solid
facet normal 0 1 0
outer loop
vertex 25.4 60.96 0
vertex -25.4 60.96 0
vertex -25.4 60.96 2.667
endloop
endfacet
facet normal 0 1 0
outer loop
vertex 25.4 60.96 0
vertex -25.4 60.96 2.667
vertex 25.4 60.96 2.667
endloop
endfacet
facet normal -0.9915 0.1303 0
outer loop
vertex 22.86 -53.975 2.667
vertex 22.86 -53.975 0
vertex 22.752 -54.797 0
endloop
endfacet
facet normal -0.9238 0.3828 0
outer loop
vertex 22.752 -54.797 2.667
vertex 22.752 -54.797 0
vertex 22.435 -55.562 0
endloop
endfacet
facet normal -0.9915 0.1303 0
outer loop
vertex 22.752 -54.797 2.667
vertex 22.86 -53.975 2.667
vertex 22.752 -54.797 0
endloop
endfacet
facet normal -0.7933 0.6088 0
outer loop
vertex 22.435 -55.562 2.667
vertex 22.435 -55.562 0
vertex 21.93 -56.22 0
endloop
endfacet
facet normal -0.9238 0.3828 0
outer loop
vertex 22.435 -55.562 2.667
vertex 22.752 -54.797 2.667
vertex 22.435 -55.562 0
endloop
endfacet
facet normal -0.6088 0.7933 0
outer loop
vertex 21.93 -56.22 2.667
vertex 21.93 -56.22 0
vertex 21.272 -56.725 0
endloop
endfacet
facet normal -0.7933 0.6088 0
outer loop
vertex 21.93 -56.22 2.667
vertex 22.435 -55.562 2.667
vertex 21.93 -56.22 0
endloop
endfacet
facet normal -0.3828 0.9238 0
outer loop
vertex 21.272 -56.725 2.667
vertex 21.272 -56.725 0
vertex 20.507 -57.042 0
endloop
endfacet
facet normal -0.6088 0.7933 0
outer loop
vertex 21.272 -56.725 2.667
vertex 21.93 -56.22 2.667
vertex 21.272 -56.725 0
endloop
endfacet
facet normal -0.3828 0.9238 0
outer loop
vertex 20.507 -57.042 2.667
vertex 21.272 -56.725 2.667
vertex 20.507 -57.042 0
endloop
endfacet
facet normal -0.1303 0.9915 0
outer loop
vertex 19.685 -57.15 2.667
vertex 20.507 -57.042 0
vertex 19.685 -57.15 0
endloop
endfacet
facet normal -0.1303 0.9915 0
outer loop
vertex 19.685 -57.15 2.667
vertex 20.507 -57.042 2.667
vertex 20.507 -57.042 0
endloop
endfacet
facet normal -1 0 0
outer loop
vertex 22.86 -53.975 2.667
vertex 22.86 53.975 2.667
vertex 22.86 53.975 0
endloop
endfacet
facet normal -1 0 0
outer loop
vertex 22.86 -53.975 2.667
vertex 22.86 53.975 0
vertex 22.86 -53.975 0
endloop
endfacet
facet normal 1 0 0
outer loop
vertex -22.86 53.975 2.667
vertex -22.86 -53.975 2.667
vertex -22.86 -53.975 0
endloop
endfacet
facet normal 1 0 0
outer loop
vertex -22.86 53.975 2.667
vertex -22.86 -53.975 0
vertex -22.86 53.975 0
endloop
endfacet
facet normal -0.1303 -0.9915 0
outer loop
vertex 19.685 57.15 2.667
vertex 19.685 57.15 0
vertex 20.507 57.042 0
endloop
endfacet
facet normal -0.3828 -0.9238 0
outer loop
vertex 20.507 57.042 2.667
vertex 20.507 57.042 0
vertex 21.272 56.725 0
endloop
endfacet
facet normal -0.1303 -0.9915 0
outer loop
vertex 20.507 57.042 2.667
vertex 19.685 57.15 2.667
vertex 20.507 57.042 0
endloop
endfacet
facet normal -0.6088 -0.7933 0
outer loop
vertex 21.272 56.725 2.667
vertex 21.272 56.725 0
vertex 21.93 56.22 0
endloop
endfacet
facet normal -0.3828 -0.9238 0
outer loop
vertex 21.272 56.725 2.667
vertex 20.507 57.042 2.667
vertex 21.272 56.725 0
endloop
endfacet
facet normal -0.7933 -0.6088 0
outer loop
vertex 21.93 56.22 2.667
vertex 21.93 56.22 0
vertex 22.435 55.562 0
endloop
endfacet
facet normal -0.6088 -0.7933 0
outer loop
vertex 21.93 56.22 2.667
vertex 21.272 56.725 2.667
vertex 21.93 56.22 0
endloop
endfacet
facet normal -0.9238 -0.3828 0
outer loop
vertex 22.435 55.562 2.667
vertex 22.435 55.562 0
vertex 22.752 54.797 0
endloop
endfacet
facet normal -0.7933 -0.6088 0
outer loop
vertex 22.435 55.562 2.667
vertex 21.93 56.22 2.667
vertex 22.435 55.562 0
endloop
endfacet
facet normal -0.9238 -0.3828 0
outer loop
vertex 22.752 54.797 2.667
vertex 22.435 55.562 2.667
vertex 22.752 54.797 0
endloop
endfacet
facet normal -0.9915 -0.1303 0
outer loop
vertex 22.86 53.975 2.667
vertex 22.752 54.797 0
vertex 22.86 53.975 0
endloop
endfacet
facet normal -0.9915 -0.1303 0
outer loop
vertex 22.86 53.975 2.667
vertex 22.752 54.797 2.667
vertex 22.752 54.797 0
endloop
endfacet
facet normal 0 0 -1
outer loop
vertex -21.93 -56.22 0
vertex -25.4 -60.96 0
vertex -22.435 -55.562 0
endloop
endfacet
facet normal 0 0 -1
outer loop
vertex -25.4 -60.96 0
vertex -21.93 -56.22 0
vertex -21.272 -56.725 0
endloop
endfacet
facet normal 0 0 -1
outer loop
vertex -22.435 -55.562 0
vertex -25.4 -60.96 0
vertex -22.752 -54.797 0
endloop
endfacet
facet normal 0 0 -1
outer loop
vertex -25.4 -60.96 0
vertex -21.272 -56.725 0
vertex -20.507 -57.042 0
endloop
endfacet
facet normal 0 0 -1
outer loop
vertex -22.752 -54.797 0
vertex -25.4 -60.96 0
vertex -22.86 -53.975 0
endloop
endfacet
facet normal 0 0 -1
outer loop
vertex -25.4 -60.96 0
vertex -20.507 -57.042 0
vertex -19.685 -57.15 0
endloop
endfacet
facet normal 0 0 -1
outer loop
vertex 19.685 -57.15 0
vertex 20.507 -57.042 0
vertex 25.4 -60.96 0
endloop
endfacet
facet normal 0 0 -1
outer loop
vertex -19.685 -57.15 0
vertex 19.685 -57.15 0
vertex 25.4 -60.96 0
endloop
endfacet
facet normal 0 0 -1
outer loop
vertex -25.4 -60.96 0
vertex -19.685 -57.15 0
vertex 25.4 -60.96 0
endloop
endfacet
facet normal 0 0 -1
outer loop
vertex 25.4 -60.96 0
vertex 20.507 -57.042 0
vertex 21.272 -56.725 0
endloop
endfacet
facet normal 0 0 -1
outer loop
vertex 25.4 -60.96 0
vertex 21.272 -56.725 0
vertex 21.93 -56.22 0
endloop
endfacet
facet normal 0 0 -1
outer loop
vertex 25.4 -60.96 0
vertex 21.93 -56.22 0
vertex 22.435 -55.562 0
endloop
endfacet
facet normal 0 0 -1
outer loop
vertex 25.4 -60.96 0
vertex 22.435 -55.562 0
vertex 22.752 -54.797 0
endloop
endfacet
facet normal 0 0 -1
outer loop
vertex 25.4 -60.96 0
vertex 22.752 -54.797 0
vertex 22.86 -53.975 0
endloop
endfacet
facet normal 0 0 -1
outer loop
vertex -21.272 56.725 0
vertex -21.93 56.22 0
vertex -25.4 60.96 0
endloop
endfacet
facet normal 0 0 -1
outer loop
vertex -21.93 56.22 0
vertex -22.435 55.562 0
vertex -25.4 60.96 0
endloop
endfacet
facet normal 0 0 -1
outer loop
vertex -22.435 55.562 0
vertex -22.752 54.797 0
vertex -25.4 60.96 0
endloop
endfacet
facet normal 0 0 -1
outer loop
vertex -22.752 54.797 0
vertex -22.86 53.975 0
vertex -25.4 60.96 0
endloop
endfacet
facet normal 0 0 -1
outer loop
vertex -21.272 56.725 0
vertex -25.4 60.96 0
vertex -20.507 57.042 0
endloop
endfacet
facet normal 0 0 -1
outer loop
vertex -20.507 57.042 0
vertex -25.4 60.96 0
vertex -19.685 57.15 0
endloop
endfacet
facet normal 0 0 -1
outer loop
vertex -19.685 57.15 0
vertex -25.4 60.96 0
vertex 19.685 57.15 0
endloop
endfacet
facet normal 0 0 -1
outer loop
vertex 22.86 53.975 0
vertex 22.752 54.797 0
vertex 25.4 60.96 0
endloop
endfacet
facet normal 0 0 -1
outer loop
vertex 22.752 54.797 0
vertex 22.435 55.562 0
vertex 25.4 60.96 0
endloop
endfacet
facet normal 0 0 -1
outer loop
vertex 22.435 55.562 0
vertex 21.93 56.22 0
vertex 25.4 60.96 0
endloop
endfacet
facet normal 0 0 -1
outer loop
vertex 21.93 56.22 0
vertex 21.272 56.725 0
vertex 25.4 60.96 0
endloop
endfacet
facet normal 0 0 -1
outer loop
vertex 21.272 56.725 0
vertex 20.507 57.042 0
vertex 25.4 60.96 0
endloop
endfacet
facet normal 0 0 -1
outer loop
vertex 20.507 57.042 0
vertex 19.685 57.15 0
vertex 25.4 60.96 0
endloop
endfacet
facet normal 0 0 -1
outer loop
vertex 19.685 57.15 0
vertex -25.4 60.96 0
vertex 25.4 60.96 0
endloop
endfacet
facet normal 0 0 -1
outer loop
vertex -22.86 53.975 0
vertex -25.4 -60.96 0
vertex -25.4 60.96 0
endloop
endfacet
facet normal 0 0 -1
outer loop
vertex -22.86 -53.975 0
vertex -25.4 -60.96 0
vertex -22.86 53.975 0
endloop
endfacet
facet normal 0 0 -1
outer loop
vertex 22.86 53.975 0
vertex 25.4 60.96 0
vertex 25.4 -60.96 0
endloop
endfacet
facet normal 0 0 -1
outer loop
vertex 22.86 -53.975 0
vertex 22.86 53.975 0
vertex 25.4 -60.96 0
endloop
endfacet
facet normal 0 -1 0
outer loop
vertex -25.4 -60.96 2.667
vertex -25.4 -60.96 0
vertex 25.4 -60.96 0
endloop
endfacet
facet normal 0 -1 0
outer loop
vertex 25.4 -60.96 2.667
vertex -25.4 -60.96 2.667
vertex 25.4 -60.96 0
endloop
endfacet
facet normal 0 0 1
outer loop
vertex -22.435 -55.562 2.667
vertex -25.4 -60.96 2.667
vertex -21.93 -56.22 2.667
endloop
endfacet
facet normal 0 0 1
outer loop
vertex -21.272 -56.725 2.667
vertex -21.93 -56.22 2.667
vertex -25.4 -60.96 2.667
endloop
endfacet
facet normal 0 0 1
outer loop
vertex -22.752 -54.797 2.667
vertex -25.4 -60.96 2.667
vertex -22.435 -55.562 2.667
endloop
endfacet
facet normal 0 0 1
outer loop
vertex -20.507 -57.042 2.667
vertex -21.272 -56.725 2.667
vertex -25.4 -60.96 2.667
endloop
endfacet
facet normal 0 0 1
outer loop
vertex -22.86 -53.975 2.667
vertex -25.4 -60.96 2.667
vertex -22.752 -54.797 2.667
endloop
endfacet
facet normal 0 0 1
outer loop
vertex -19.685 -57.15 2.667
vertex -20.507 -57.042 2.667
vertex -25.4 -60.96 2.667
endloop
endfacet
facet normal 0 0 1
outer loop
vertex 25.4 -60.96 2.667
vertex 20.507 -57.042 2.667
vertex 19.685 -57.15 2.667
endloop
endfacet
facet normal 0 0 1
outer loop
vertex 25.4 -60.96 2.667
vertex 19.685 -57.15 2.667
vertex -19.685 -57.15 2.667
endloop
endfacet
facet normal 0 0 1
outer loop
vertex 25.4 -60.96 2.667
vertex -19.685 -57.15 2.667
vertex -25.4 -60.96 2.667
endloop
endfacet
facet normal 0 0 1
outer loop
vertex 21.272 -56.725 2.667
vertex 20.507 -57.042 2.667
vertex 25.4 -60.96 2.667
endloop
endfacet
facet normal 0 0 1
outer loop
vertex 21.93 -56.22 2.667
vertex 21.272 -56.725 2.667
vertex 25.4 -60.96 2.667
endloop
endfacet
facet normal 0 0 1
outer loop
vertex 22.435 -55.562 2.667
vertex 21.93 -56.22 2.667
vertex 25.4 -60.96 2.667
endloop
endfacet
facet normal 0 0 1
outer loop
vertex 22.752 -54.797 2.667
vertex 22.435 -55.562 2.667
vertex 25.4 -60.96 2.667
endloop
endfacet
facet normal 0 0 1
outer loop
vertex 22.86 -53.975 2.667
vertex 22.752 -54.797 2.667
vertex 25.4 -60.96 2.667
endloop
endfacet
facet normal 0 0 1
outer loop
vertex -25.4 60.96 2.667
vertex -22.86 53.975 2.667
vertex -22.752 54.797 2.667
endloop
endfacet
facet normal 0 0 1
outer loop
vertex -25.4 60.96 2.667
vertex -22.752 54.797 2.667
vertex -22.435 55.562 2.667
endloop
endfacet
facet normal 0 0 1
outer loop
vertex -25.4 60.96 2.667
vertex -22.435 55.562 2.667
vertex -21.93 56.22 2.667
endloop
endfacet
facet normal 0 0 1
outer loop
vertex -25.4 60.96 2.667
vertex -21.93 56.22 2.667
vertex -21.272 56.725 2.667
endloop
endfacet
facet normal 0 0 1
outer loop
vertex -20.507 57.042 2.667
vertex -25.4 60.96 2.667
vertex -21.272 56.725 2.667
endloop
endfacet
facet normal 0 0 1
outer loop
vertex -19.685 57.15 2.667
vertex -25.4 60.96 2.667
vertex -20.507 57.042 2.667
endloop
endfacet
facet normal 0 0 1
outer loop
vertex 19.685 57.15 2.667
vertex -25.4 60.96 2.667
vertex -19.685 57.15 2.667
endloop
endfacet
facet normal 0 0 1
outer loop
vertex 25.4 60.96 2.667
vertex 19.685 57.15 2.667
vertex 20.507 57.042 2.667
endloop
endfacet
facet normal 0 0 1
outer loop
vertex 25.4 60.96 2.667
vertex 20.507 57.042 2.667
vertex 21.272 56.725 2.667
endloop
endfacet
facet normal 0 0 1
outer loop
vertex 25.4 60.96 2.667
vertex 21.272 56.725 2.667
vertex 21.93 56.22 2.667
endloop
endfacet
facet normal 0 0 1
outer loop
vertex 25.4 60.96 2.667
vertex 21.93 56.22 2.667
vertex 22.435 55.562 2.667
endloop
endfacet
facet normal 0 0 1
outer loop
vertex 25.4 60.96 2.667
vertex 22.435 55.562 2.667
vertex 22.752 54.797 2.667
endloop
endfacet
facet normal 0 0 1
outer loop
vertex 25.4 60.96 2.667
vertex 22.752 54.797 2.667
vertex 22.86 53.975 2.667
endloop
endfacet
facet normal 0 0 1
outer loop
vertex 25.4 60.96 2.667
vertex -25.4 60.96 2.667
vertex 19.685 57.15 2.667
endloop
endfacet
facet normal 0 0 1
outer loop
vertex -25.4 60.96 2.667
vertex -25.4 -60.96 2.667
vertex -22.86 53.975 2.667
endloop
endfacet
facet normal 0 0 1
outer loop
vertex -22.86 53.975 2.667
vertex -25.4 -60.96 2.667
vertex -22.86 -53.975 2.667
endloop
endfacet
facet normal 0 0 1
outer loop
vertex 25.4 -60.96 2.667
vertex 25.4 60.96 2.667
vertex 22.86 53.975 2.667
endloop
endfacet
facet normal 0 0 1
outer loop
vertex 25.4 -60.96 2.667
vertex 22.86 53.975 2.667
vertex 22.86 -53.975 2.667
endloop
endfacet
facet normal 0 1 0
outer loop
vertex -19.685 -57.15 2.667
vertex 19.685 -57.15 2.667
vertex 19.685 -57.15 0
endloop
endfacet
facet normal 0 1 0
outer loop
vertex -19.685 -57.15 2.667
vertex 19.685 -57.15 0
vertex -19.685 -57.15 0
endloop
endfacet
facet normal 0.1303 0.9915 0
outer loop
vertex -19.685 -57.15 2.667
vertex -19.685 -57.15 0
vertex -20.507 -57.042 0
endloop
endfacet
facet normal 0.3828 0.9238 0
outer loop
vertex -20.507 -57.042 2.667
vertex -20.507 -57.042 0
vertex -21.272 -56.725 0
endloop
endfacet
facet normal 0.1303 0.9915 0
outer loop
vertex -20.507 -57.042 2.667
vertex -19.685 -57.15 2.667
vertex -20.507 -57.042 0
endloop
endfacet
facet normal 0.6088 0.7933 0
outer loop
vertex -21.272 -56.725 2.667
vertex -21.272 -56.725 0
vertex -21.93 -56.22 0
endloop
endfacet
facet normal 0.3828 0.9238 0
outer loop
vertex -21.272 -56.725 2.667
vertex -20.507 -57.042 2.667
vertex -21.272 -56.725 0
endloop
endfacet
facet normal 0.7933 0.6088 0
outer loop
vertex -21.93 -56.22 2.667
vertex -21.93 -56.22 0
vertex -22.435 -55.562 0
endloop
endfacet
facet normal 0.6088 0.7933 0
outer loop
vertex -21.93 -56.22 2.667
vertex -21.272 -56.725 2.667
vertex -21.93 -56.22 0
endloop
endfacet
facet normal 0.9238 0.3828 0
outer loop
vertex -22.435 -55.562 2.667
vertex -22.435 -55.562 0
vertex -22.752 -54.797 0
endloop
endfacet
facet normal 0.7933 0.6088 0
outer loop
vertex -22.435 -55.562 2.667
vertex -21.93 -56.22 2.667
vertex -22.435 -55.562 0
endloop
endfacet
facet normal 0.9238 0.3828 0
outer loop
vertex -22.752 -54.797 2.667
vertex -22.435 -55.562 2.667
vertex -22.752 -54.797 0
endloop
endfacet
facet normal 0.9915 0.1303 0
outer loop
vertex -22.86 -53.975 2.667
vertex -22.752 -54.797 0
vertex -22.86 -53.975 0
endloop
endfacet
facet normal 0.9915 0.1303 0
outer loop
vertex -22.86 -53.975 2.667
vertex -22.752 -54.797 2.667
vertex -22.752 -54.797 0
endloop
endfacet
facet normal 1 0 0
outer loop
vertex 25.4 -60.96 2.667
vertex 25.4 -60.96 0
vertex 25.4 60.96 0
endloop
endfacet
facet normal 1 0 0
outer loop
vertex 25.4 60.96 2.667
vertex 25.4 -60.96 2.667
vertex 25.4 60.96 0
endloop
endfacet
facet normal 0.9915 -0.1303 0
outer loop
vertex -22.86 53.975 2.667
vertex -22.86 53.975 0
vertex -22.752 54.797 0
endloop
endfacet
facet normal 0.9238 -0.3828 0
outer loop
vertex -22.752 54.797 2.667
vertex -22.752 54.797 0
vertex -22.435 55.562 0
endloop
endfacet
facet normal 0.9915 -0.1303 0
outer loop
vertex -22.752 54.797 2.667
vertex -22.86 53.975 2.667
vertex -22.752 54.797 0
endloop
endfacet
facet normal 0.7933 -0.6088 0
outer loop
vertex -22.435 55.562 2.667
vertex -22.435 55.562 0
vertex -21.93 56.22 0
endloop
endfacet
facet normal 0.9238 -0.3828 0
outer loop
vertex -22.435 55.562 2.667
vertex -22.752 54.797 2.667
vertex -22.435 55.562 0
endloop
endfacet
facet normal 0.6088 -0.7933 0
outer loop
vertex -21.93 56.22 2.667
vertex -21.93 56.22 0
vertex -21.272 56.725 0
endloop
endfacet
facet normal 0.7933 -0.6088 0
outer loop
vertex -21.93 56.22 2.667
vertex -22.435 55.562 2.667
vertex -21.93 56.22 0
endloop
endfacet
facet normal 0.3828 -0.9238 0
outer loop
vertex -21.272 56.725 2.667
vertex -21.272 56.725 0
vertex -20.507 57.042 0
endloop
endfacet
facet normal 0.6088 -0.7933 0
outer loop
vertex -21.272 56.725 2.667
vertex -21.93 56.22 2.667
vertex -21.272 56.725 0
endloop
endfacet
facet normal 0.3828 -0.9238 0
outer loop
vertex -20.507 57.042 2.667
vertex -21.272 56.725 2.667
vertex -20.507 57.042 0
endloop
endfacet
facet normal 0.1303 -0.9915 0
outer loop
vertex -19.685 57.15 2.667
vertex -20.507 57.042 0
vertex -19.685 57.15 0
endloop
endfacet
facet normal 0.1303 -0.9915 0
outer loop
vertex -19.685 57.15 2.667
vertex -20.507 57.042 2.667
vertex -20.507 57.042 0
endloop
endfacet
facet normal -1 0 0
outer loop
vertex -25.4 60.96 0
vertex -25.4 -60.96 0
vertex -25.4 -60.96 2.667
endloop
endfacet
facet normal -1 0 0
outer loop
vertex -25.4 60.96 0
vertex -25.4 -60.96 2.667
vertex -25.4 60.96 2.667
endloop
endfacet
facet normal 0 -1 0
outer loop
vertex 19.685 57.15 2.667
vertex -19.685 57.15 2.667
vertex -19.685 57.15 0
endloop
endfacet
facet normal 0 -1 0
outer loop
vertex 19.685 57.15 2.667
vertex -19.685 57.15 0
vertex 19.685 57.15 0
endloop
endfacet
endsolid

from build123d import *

# Parameters (mm, degrees)
SKETCH1_W           = 50.8
SKETCH1_H           = 121.92
BOSS_EXTRUDE1_DEPTH = 2.667
CUT_EXTRUDE1_DEPTH  = 67.093830945


with BuildPart() as part:
    # Sketch1 → Boss-Extrude1 (new body)
    with BuildSketch(Plane.XY):
        Rectangle(SKETCH1_W, SKETCH1_H)
    extrude(amount=BOSS_EXTRUDE1_DEPTH)

    # Sketch2 → Cut-Extrude1 (cut, through all)
    with BuildSketch(Plane.XY.offset(2.667)):
        with BuildLine():
            Line((19.685, -57.15), (-19.685, -57.15))
            ThreePointArc((-19.685, -57.15), (-21.93006403, -56.22006403), (-22.86, -53.975))
            Line((-22.86, -53.975), (-22.86, 53.975))
            ThreePointArc((-22.86, 53.975), (-21.93006403, 56.22006403), (-19.685, 57.15))
            Line((-19.685, 57.15), (19.685, 57.15))
            ThreePointArc((19.685, 57.15), (21.93006403, 56.22006403), (22.86, 53.975))
            Line((22.86, 53.975), (22.86, -53.975))
            ThreePointArc((22.86, -53.975), (21.93006403, -56.22006403), (19.685, -57.15))
        make_face()
    extrude(amount=-CUT_EXTRUDE1_DEPTH, mode=Mode.SUBTRACT)


solid = part.part
